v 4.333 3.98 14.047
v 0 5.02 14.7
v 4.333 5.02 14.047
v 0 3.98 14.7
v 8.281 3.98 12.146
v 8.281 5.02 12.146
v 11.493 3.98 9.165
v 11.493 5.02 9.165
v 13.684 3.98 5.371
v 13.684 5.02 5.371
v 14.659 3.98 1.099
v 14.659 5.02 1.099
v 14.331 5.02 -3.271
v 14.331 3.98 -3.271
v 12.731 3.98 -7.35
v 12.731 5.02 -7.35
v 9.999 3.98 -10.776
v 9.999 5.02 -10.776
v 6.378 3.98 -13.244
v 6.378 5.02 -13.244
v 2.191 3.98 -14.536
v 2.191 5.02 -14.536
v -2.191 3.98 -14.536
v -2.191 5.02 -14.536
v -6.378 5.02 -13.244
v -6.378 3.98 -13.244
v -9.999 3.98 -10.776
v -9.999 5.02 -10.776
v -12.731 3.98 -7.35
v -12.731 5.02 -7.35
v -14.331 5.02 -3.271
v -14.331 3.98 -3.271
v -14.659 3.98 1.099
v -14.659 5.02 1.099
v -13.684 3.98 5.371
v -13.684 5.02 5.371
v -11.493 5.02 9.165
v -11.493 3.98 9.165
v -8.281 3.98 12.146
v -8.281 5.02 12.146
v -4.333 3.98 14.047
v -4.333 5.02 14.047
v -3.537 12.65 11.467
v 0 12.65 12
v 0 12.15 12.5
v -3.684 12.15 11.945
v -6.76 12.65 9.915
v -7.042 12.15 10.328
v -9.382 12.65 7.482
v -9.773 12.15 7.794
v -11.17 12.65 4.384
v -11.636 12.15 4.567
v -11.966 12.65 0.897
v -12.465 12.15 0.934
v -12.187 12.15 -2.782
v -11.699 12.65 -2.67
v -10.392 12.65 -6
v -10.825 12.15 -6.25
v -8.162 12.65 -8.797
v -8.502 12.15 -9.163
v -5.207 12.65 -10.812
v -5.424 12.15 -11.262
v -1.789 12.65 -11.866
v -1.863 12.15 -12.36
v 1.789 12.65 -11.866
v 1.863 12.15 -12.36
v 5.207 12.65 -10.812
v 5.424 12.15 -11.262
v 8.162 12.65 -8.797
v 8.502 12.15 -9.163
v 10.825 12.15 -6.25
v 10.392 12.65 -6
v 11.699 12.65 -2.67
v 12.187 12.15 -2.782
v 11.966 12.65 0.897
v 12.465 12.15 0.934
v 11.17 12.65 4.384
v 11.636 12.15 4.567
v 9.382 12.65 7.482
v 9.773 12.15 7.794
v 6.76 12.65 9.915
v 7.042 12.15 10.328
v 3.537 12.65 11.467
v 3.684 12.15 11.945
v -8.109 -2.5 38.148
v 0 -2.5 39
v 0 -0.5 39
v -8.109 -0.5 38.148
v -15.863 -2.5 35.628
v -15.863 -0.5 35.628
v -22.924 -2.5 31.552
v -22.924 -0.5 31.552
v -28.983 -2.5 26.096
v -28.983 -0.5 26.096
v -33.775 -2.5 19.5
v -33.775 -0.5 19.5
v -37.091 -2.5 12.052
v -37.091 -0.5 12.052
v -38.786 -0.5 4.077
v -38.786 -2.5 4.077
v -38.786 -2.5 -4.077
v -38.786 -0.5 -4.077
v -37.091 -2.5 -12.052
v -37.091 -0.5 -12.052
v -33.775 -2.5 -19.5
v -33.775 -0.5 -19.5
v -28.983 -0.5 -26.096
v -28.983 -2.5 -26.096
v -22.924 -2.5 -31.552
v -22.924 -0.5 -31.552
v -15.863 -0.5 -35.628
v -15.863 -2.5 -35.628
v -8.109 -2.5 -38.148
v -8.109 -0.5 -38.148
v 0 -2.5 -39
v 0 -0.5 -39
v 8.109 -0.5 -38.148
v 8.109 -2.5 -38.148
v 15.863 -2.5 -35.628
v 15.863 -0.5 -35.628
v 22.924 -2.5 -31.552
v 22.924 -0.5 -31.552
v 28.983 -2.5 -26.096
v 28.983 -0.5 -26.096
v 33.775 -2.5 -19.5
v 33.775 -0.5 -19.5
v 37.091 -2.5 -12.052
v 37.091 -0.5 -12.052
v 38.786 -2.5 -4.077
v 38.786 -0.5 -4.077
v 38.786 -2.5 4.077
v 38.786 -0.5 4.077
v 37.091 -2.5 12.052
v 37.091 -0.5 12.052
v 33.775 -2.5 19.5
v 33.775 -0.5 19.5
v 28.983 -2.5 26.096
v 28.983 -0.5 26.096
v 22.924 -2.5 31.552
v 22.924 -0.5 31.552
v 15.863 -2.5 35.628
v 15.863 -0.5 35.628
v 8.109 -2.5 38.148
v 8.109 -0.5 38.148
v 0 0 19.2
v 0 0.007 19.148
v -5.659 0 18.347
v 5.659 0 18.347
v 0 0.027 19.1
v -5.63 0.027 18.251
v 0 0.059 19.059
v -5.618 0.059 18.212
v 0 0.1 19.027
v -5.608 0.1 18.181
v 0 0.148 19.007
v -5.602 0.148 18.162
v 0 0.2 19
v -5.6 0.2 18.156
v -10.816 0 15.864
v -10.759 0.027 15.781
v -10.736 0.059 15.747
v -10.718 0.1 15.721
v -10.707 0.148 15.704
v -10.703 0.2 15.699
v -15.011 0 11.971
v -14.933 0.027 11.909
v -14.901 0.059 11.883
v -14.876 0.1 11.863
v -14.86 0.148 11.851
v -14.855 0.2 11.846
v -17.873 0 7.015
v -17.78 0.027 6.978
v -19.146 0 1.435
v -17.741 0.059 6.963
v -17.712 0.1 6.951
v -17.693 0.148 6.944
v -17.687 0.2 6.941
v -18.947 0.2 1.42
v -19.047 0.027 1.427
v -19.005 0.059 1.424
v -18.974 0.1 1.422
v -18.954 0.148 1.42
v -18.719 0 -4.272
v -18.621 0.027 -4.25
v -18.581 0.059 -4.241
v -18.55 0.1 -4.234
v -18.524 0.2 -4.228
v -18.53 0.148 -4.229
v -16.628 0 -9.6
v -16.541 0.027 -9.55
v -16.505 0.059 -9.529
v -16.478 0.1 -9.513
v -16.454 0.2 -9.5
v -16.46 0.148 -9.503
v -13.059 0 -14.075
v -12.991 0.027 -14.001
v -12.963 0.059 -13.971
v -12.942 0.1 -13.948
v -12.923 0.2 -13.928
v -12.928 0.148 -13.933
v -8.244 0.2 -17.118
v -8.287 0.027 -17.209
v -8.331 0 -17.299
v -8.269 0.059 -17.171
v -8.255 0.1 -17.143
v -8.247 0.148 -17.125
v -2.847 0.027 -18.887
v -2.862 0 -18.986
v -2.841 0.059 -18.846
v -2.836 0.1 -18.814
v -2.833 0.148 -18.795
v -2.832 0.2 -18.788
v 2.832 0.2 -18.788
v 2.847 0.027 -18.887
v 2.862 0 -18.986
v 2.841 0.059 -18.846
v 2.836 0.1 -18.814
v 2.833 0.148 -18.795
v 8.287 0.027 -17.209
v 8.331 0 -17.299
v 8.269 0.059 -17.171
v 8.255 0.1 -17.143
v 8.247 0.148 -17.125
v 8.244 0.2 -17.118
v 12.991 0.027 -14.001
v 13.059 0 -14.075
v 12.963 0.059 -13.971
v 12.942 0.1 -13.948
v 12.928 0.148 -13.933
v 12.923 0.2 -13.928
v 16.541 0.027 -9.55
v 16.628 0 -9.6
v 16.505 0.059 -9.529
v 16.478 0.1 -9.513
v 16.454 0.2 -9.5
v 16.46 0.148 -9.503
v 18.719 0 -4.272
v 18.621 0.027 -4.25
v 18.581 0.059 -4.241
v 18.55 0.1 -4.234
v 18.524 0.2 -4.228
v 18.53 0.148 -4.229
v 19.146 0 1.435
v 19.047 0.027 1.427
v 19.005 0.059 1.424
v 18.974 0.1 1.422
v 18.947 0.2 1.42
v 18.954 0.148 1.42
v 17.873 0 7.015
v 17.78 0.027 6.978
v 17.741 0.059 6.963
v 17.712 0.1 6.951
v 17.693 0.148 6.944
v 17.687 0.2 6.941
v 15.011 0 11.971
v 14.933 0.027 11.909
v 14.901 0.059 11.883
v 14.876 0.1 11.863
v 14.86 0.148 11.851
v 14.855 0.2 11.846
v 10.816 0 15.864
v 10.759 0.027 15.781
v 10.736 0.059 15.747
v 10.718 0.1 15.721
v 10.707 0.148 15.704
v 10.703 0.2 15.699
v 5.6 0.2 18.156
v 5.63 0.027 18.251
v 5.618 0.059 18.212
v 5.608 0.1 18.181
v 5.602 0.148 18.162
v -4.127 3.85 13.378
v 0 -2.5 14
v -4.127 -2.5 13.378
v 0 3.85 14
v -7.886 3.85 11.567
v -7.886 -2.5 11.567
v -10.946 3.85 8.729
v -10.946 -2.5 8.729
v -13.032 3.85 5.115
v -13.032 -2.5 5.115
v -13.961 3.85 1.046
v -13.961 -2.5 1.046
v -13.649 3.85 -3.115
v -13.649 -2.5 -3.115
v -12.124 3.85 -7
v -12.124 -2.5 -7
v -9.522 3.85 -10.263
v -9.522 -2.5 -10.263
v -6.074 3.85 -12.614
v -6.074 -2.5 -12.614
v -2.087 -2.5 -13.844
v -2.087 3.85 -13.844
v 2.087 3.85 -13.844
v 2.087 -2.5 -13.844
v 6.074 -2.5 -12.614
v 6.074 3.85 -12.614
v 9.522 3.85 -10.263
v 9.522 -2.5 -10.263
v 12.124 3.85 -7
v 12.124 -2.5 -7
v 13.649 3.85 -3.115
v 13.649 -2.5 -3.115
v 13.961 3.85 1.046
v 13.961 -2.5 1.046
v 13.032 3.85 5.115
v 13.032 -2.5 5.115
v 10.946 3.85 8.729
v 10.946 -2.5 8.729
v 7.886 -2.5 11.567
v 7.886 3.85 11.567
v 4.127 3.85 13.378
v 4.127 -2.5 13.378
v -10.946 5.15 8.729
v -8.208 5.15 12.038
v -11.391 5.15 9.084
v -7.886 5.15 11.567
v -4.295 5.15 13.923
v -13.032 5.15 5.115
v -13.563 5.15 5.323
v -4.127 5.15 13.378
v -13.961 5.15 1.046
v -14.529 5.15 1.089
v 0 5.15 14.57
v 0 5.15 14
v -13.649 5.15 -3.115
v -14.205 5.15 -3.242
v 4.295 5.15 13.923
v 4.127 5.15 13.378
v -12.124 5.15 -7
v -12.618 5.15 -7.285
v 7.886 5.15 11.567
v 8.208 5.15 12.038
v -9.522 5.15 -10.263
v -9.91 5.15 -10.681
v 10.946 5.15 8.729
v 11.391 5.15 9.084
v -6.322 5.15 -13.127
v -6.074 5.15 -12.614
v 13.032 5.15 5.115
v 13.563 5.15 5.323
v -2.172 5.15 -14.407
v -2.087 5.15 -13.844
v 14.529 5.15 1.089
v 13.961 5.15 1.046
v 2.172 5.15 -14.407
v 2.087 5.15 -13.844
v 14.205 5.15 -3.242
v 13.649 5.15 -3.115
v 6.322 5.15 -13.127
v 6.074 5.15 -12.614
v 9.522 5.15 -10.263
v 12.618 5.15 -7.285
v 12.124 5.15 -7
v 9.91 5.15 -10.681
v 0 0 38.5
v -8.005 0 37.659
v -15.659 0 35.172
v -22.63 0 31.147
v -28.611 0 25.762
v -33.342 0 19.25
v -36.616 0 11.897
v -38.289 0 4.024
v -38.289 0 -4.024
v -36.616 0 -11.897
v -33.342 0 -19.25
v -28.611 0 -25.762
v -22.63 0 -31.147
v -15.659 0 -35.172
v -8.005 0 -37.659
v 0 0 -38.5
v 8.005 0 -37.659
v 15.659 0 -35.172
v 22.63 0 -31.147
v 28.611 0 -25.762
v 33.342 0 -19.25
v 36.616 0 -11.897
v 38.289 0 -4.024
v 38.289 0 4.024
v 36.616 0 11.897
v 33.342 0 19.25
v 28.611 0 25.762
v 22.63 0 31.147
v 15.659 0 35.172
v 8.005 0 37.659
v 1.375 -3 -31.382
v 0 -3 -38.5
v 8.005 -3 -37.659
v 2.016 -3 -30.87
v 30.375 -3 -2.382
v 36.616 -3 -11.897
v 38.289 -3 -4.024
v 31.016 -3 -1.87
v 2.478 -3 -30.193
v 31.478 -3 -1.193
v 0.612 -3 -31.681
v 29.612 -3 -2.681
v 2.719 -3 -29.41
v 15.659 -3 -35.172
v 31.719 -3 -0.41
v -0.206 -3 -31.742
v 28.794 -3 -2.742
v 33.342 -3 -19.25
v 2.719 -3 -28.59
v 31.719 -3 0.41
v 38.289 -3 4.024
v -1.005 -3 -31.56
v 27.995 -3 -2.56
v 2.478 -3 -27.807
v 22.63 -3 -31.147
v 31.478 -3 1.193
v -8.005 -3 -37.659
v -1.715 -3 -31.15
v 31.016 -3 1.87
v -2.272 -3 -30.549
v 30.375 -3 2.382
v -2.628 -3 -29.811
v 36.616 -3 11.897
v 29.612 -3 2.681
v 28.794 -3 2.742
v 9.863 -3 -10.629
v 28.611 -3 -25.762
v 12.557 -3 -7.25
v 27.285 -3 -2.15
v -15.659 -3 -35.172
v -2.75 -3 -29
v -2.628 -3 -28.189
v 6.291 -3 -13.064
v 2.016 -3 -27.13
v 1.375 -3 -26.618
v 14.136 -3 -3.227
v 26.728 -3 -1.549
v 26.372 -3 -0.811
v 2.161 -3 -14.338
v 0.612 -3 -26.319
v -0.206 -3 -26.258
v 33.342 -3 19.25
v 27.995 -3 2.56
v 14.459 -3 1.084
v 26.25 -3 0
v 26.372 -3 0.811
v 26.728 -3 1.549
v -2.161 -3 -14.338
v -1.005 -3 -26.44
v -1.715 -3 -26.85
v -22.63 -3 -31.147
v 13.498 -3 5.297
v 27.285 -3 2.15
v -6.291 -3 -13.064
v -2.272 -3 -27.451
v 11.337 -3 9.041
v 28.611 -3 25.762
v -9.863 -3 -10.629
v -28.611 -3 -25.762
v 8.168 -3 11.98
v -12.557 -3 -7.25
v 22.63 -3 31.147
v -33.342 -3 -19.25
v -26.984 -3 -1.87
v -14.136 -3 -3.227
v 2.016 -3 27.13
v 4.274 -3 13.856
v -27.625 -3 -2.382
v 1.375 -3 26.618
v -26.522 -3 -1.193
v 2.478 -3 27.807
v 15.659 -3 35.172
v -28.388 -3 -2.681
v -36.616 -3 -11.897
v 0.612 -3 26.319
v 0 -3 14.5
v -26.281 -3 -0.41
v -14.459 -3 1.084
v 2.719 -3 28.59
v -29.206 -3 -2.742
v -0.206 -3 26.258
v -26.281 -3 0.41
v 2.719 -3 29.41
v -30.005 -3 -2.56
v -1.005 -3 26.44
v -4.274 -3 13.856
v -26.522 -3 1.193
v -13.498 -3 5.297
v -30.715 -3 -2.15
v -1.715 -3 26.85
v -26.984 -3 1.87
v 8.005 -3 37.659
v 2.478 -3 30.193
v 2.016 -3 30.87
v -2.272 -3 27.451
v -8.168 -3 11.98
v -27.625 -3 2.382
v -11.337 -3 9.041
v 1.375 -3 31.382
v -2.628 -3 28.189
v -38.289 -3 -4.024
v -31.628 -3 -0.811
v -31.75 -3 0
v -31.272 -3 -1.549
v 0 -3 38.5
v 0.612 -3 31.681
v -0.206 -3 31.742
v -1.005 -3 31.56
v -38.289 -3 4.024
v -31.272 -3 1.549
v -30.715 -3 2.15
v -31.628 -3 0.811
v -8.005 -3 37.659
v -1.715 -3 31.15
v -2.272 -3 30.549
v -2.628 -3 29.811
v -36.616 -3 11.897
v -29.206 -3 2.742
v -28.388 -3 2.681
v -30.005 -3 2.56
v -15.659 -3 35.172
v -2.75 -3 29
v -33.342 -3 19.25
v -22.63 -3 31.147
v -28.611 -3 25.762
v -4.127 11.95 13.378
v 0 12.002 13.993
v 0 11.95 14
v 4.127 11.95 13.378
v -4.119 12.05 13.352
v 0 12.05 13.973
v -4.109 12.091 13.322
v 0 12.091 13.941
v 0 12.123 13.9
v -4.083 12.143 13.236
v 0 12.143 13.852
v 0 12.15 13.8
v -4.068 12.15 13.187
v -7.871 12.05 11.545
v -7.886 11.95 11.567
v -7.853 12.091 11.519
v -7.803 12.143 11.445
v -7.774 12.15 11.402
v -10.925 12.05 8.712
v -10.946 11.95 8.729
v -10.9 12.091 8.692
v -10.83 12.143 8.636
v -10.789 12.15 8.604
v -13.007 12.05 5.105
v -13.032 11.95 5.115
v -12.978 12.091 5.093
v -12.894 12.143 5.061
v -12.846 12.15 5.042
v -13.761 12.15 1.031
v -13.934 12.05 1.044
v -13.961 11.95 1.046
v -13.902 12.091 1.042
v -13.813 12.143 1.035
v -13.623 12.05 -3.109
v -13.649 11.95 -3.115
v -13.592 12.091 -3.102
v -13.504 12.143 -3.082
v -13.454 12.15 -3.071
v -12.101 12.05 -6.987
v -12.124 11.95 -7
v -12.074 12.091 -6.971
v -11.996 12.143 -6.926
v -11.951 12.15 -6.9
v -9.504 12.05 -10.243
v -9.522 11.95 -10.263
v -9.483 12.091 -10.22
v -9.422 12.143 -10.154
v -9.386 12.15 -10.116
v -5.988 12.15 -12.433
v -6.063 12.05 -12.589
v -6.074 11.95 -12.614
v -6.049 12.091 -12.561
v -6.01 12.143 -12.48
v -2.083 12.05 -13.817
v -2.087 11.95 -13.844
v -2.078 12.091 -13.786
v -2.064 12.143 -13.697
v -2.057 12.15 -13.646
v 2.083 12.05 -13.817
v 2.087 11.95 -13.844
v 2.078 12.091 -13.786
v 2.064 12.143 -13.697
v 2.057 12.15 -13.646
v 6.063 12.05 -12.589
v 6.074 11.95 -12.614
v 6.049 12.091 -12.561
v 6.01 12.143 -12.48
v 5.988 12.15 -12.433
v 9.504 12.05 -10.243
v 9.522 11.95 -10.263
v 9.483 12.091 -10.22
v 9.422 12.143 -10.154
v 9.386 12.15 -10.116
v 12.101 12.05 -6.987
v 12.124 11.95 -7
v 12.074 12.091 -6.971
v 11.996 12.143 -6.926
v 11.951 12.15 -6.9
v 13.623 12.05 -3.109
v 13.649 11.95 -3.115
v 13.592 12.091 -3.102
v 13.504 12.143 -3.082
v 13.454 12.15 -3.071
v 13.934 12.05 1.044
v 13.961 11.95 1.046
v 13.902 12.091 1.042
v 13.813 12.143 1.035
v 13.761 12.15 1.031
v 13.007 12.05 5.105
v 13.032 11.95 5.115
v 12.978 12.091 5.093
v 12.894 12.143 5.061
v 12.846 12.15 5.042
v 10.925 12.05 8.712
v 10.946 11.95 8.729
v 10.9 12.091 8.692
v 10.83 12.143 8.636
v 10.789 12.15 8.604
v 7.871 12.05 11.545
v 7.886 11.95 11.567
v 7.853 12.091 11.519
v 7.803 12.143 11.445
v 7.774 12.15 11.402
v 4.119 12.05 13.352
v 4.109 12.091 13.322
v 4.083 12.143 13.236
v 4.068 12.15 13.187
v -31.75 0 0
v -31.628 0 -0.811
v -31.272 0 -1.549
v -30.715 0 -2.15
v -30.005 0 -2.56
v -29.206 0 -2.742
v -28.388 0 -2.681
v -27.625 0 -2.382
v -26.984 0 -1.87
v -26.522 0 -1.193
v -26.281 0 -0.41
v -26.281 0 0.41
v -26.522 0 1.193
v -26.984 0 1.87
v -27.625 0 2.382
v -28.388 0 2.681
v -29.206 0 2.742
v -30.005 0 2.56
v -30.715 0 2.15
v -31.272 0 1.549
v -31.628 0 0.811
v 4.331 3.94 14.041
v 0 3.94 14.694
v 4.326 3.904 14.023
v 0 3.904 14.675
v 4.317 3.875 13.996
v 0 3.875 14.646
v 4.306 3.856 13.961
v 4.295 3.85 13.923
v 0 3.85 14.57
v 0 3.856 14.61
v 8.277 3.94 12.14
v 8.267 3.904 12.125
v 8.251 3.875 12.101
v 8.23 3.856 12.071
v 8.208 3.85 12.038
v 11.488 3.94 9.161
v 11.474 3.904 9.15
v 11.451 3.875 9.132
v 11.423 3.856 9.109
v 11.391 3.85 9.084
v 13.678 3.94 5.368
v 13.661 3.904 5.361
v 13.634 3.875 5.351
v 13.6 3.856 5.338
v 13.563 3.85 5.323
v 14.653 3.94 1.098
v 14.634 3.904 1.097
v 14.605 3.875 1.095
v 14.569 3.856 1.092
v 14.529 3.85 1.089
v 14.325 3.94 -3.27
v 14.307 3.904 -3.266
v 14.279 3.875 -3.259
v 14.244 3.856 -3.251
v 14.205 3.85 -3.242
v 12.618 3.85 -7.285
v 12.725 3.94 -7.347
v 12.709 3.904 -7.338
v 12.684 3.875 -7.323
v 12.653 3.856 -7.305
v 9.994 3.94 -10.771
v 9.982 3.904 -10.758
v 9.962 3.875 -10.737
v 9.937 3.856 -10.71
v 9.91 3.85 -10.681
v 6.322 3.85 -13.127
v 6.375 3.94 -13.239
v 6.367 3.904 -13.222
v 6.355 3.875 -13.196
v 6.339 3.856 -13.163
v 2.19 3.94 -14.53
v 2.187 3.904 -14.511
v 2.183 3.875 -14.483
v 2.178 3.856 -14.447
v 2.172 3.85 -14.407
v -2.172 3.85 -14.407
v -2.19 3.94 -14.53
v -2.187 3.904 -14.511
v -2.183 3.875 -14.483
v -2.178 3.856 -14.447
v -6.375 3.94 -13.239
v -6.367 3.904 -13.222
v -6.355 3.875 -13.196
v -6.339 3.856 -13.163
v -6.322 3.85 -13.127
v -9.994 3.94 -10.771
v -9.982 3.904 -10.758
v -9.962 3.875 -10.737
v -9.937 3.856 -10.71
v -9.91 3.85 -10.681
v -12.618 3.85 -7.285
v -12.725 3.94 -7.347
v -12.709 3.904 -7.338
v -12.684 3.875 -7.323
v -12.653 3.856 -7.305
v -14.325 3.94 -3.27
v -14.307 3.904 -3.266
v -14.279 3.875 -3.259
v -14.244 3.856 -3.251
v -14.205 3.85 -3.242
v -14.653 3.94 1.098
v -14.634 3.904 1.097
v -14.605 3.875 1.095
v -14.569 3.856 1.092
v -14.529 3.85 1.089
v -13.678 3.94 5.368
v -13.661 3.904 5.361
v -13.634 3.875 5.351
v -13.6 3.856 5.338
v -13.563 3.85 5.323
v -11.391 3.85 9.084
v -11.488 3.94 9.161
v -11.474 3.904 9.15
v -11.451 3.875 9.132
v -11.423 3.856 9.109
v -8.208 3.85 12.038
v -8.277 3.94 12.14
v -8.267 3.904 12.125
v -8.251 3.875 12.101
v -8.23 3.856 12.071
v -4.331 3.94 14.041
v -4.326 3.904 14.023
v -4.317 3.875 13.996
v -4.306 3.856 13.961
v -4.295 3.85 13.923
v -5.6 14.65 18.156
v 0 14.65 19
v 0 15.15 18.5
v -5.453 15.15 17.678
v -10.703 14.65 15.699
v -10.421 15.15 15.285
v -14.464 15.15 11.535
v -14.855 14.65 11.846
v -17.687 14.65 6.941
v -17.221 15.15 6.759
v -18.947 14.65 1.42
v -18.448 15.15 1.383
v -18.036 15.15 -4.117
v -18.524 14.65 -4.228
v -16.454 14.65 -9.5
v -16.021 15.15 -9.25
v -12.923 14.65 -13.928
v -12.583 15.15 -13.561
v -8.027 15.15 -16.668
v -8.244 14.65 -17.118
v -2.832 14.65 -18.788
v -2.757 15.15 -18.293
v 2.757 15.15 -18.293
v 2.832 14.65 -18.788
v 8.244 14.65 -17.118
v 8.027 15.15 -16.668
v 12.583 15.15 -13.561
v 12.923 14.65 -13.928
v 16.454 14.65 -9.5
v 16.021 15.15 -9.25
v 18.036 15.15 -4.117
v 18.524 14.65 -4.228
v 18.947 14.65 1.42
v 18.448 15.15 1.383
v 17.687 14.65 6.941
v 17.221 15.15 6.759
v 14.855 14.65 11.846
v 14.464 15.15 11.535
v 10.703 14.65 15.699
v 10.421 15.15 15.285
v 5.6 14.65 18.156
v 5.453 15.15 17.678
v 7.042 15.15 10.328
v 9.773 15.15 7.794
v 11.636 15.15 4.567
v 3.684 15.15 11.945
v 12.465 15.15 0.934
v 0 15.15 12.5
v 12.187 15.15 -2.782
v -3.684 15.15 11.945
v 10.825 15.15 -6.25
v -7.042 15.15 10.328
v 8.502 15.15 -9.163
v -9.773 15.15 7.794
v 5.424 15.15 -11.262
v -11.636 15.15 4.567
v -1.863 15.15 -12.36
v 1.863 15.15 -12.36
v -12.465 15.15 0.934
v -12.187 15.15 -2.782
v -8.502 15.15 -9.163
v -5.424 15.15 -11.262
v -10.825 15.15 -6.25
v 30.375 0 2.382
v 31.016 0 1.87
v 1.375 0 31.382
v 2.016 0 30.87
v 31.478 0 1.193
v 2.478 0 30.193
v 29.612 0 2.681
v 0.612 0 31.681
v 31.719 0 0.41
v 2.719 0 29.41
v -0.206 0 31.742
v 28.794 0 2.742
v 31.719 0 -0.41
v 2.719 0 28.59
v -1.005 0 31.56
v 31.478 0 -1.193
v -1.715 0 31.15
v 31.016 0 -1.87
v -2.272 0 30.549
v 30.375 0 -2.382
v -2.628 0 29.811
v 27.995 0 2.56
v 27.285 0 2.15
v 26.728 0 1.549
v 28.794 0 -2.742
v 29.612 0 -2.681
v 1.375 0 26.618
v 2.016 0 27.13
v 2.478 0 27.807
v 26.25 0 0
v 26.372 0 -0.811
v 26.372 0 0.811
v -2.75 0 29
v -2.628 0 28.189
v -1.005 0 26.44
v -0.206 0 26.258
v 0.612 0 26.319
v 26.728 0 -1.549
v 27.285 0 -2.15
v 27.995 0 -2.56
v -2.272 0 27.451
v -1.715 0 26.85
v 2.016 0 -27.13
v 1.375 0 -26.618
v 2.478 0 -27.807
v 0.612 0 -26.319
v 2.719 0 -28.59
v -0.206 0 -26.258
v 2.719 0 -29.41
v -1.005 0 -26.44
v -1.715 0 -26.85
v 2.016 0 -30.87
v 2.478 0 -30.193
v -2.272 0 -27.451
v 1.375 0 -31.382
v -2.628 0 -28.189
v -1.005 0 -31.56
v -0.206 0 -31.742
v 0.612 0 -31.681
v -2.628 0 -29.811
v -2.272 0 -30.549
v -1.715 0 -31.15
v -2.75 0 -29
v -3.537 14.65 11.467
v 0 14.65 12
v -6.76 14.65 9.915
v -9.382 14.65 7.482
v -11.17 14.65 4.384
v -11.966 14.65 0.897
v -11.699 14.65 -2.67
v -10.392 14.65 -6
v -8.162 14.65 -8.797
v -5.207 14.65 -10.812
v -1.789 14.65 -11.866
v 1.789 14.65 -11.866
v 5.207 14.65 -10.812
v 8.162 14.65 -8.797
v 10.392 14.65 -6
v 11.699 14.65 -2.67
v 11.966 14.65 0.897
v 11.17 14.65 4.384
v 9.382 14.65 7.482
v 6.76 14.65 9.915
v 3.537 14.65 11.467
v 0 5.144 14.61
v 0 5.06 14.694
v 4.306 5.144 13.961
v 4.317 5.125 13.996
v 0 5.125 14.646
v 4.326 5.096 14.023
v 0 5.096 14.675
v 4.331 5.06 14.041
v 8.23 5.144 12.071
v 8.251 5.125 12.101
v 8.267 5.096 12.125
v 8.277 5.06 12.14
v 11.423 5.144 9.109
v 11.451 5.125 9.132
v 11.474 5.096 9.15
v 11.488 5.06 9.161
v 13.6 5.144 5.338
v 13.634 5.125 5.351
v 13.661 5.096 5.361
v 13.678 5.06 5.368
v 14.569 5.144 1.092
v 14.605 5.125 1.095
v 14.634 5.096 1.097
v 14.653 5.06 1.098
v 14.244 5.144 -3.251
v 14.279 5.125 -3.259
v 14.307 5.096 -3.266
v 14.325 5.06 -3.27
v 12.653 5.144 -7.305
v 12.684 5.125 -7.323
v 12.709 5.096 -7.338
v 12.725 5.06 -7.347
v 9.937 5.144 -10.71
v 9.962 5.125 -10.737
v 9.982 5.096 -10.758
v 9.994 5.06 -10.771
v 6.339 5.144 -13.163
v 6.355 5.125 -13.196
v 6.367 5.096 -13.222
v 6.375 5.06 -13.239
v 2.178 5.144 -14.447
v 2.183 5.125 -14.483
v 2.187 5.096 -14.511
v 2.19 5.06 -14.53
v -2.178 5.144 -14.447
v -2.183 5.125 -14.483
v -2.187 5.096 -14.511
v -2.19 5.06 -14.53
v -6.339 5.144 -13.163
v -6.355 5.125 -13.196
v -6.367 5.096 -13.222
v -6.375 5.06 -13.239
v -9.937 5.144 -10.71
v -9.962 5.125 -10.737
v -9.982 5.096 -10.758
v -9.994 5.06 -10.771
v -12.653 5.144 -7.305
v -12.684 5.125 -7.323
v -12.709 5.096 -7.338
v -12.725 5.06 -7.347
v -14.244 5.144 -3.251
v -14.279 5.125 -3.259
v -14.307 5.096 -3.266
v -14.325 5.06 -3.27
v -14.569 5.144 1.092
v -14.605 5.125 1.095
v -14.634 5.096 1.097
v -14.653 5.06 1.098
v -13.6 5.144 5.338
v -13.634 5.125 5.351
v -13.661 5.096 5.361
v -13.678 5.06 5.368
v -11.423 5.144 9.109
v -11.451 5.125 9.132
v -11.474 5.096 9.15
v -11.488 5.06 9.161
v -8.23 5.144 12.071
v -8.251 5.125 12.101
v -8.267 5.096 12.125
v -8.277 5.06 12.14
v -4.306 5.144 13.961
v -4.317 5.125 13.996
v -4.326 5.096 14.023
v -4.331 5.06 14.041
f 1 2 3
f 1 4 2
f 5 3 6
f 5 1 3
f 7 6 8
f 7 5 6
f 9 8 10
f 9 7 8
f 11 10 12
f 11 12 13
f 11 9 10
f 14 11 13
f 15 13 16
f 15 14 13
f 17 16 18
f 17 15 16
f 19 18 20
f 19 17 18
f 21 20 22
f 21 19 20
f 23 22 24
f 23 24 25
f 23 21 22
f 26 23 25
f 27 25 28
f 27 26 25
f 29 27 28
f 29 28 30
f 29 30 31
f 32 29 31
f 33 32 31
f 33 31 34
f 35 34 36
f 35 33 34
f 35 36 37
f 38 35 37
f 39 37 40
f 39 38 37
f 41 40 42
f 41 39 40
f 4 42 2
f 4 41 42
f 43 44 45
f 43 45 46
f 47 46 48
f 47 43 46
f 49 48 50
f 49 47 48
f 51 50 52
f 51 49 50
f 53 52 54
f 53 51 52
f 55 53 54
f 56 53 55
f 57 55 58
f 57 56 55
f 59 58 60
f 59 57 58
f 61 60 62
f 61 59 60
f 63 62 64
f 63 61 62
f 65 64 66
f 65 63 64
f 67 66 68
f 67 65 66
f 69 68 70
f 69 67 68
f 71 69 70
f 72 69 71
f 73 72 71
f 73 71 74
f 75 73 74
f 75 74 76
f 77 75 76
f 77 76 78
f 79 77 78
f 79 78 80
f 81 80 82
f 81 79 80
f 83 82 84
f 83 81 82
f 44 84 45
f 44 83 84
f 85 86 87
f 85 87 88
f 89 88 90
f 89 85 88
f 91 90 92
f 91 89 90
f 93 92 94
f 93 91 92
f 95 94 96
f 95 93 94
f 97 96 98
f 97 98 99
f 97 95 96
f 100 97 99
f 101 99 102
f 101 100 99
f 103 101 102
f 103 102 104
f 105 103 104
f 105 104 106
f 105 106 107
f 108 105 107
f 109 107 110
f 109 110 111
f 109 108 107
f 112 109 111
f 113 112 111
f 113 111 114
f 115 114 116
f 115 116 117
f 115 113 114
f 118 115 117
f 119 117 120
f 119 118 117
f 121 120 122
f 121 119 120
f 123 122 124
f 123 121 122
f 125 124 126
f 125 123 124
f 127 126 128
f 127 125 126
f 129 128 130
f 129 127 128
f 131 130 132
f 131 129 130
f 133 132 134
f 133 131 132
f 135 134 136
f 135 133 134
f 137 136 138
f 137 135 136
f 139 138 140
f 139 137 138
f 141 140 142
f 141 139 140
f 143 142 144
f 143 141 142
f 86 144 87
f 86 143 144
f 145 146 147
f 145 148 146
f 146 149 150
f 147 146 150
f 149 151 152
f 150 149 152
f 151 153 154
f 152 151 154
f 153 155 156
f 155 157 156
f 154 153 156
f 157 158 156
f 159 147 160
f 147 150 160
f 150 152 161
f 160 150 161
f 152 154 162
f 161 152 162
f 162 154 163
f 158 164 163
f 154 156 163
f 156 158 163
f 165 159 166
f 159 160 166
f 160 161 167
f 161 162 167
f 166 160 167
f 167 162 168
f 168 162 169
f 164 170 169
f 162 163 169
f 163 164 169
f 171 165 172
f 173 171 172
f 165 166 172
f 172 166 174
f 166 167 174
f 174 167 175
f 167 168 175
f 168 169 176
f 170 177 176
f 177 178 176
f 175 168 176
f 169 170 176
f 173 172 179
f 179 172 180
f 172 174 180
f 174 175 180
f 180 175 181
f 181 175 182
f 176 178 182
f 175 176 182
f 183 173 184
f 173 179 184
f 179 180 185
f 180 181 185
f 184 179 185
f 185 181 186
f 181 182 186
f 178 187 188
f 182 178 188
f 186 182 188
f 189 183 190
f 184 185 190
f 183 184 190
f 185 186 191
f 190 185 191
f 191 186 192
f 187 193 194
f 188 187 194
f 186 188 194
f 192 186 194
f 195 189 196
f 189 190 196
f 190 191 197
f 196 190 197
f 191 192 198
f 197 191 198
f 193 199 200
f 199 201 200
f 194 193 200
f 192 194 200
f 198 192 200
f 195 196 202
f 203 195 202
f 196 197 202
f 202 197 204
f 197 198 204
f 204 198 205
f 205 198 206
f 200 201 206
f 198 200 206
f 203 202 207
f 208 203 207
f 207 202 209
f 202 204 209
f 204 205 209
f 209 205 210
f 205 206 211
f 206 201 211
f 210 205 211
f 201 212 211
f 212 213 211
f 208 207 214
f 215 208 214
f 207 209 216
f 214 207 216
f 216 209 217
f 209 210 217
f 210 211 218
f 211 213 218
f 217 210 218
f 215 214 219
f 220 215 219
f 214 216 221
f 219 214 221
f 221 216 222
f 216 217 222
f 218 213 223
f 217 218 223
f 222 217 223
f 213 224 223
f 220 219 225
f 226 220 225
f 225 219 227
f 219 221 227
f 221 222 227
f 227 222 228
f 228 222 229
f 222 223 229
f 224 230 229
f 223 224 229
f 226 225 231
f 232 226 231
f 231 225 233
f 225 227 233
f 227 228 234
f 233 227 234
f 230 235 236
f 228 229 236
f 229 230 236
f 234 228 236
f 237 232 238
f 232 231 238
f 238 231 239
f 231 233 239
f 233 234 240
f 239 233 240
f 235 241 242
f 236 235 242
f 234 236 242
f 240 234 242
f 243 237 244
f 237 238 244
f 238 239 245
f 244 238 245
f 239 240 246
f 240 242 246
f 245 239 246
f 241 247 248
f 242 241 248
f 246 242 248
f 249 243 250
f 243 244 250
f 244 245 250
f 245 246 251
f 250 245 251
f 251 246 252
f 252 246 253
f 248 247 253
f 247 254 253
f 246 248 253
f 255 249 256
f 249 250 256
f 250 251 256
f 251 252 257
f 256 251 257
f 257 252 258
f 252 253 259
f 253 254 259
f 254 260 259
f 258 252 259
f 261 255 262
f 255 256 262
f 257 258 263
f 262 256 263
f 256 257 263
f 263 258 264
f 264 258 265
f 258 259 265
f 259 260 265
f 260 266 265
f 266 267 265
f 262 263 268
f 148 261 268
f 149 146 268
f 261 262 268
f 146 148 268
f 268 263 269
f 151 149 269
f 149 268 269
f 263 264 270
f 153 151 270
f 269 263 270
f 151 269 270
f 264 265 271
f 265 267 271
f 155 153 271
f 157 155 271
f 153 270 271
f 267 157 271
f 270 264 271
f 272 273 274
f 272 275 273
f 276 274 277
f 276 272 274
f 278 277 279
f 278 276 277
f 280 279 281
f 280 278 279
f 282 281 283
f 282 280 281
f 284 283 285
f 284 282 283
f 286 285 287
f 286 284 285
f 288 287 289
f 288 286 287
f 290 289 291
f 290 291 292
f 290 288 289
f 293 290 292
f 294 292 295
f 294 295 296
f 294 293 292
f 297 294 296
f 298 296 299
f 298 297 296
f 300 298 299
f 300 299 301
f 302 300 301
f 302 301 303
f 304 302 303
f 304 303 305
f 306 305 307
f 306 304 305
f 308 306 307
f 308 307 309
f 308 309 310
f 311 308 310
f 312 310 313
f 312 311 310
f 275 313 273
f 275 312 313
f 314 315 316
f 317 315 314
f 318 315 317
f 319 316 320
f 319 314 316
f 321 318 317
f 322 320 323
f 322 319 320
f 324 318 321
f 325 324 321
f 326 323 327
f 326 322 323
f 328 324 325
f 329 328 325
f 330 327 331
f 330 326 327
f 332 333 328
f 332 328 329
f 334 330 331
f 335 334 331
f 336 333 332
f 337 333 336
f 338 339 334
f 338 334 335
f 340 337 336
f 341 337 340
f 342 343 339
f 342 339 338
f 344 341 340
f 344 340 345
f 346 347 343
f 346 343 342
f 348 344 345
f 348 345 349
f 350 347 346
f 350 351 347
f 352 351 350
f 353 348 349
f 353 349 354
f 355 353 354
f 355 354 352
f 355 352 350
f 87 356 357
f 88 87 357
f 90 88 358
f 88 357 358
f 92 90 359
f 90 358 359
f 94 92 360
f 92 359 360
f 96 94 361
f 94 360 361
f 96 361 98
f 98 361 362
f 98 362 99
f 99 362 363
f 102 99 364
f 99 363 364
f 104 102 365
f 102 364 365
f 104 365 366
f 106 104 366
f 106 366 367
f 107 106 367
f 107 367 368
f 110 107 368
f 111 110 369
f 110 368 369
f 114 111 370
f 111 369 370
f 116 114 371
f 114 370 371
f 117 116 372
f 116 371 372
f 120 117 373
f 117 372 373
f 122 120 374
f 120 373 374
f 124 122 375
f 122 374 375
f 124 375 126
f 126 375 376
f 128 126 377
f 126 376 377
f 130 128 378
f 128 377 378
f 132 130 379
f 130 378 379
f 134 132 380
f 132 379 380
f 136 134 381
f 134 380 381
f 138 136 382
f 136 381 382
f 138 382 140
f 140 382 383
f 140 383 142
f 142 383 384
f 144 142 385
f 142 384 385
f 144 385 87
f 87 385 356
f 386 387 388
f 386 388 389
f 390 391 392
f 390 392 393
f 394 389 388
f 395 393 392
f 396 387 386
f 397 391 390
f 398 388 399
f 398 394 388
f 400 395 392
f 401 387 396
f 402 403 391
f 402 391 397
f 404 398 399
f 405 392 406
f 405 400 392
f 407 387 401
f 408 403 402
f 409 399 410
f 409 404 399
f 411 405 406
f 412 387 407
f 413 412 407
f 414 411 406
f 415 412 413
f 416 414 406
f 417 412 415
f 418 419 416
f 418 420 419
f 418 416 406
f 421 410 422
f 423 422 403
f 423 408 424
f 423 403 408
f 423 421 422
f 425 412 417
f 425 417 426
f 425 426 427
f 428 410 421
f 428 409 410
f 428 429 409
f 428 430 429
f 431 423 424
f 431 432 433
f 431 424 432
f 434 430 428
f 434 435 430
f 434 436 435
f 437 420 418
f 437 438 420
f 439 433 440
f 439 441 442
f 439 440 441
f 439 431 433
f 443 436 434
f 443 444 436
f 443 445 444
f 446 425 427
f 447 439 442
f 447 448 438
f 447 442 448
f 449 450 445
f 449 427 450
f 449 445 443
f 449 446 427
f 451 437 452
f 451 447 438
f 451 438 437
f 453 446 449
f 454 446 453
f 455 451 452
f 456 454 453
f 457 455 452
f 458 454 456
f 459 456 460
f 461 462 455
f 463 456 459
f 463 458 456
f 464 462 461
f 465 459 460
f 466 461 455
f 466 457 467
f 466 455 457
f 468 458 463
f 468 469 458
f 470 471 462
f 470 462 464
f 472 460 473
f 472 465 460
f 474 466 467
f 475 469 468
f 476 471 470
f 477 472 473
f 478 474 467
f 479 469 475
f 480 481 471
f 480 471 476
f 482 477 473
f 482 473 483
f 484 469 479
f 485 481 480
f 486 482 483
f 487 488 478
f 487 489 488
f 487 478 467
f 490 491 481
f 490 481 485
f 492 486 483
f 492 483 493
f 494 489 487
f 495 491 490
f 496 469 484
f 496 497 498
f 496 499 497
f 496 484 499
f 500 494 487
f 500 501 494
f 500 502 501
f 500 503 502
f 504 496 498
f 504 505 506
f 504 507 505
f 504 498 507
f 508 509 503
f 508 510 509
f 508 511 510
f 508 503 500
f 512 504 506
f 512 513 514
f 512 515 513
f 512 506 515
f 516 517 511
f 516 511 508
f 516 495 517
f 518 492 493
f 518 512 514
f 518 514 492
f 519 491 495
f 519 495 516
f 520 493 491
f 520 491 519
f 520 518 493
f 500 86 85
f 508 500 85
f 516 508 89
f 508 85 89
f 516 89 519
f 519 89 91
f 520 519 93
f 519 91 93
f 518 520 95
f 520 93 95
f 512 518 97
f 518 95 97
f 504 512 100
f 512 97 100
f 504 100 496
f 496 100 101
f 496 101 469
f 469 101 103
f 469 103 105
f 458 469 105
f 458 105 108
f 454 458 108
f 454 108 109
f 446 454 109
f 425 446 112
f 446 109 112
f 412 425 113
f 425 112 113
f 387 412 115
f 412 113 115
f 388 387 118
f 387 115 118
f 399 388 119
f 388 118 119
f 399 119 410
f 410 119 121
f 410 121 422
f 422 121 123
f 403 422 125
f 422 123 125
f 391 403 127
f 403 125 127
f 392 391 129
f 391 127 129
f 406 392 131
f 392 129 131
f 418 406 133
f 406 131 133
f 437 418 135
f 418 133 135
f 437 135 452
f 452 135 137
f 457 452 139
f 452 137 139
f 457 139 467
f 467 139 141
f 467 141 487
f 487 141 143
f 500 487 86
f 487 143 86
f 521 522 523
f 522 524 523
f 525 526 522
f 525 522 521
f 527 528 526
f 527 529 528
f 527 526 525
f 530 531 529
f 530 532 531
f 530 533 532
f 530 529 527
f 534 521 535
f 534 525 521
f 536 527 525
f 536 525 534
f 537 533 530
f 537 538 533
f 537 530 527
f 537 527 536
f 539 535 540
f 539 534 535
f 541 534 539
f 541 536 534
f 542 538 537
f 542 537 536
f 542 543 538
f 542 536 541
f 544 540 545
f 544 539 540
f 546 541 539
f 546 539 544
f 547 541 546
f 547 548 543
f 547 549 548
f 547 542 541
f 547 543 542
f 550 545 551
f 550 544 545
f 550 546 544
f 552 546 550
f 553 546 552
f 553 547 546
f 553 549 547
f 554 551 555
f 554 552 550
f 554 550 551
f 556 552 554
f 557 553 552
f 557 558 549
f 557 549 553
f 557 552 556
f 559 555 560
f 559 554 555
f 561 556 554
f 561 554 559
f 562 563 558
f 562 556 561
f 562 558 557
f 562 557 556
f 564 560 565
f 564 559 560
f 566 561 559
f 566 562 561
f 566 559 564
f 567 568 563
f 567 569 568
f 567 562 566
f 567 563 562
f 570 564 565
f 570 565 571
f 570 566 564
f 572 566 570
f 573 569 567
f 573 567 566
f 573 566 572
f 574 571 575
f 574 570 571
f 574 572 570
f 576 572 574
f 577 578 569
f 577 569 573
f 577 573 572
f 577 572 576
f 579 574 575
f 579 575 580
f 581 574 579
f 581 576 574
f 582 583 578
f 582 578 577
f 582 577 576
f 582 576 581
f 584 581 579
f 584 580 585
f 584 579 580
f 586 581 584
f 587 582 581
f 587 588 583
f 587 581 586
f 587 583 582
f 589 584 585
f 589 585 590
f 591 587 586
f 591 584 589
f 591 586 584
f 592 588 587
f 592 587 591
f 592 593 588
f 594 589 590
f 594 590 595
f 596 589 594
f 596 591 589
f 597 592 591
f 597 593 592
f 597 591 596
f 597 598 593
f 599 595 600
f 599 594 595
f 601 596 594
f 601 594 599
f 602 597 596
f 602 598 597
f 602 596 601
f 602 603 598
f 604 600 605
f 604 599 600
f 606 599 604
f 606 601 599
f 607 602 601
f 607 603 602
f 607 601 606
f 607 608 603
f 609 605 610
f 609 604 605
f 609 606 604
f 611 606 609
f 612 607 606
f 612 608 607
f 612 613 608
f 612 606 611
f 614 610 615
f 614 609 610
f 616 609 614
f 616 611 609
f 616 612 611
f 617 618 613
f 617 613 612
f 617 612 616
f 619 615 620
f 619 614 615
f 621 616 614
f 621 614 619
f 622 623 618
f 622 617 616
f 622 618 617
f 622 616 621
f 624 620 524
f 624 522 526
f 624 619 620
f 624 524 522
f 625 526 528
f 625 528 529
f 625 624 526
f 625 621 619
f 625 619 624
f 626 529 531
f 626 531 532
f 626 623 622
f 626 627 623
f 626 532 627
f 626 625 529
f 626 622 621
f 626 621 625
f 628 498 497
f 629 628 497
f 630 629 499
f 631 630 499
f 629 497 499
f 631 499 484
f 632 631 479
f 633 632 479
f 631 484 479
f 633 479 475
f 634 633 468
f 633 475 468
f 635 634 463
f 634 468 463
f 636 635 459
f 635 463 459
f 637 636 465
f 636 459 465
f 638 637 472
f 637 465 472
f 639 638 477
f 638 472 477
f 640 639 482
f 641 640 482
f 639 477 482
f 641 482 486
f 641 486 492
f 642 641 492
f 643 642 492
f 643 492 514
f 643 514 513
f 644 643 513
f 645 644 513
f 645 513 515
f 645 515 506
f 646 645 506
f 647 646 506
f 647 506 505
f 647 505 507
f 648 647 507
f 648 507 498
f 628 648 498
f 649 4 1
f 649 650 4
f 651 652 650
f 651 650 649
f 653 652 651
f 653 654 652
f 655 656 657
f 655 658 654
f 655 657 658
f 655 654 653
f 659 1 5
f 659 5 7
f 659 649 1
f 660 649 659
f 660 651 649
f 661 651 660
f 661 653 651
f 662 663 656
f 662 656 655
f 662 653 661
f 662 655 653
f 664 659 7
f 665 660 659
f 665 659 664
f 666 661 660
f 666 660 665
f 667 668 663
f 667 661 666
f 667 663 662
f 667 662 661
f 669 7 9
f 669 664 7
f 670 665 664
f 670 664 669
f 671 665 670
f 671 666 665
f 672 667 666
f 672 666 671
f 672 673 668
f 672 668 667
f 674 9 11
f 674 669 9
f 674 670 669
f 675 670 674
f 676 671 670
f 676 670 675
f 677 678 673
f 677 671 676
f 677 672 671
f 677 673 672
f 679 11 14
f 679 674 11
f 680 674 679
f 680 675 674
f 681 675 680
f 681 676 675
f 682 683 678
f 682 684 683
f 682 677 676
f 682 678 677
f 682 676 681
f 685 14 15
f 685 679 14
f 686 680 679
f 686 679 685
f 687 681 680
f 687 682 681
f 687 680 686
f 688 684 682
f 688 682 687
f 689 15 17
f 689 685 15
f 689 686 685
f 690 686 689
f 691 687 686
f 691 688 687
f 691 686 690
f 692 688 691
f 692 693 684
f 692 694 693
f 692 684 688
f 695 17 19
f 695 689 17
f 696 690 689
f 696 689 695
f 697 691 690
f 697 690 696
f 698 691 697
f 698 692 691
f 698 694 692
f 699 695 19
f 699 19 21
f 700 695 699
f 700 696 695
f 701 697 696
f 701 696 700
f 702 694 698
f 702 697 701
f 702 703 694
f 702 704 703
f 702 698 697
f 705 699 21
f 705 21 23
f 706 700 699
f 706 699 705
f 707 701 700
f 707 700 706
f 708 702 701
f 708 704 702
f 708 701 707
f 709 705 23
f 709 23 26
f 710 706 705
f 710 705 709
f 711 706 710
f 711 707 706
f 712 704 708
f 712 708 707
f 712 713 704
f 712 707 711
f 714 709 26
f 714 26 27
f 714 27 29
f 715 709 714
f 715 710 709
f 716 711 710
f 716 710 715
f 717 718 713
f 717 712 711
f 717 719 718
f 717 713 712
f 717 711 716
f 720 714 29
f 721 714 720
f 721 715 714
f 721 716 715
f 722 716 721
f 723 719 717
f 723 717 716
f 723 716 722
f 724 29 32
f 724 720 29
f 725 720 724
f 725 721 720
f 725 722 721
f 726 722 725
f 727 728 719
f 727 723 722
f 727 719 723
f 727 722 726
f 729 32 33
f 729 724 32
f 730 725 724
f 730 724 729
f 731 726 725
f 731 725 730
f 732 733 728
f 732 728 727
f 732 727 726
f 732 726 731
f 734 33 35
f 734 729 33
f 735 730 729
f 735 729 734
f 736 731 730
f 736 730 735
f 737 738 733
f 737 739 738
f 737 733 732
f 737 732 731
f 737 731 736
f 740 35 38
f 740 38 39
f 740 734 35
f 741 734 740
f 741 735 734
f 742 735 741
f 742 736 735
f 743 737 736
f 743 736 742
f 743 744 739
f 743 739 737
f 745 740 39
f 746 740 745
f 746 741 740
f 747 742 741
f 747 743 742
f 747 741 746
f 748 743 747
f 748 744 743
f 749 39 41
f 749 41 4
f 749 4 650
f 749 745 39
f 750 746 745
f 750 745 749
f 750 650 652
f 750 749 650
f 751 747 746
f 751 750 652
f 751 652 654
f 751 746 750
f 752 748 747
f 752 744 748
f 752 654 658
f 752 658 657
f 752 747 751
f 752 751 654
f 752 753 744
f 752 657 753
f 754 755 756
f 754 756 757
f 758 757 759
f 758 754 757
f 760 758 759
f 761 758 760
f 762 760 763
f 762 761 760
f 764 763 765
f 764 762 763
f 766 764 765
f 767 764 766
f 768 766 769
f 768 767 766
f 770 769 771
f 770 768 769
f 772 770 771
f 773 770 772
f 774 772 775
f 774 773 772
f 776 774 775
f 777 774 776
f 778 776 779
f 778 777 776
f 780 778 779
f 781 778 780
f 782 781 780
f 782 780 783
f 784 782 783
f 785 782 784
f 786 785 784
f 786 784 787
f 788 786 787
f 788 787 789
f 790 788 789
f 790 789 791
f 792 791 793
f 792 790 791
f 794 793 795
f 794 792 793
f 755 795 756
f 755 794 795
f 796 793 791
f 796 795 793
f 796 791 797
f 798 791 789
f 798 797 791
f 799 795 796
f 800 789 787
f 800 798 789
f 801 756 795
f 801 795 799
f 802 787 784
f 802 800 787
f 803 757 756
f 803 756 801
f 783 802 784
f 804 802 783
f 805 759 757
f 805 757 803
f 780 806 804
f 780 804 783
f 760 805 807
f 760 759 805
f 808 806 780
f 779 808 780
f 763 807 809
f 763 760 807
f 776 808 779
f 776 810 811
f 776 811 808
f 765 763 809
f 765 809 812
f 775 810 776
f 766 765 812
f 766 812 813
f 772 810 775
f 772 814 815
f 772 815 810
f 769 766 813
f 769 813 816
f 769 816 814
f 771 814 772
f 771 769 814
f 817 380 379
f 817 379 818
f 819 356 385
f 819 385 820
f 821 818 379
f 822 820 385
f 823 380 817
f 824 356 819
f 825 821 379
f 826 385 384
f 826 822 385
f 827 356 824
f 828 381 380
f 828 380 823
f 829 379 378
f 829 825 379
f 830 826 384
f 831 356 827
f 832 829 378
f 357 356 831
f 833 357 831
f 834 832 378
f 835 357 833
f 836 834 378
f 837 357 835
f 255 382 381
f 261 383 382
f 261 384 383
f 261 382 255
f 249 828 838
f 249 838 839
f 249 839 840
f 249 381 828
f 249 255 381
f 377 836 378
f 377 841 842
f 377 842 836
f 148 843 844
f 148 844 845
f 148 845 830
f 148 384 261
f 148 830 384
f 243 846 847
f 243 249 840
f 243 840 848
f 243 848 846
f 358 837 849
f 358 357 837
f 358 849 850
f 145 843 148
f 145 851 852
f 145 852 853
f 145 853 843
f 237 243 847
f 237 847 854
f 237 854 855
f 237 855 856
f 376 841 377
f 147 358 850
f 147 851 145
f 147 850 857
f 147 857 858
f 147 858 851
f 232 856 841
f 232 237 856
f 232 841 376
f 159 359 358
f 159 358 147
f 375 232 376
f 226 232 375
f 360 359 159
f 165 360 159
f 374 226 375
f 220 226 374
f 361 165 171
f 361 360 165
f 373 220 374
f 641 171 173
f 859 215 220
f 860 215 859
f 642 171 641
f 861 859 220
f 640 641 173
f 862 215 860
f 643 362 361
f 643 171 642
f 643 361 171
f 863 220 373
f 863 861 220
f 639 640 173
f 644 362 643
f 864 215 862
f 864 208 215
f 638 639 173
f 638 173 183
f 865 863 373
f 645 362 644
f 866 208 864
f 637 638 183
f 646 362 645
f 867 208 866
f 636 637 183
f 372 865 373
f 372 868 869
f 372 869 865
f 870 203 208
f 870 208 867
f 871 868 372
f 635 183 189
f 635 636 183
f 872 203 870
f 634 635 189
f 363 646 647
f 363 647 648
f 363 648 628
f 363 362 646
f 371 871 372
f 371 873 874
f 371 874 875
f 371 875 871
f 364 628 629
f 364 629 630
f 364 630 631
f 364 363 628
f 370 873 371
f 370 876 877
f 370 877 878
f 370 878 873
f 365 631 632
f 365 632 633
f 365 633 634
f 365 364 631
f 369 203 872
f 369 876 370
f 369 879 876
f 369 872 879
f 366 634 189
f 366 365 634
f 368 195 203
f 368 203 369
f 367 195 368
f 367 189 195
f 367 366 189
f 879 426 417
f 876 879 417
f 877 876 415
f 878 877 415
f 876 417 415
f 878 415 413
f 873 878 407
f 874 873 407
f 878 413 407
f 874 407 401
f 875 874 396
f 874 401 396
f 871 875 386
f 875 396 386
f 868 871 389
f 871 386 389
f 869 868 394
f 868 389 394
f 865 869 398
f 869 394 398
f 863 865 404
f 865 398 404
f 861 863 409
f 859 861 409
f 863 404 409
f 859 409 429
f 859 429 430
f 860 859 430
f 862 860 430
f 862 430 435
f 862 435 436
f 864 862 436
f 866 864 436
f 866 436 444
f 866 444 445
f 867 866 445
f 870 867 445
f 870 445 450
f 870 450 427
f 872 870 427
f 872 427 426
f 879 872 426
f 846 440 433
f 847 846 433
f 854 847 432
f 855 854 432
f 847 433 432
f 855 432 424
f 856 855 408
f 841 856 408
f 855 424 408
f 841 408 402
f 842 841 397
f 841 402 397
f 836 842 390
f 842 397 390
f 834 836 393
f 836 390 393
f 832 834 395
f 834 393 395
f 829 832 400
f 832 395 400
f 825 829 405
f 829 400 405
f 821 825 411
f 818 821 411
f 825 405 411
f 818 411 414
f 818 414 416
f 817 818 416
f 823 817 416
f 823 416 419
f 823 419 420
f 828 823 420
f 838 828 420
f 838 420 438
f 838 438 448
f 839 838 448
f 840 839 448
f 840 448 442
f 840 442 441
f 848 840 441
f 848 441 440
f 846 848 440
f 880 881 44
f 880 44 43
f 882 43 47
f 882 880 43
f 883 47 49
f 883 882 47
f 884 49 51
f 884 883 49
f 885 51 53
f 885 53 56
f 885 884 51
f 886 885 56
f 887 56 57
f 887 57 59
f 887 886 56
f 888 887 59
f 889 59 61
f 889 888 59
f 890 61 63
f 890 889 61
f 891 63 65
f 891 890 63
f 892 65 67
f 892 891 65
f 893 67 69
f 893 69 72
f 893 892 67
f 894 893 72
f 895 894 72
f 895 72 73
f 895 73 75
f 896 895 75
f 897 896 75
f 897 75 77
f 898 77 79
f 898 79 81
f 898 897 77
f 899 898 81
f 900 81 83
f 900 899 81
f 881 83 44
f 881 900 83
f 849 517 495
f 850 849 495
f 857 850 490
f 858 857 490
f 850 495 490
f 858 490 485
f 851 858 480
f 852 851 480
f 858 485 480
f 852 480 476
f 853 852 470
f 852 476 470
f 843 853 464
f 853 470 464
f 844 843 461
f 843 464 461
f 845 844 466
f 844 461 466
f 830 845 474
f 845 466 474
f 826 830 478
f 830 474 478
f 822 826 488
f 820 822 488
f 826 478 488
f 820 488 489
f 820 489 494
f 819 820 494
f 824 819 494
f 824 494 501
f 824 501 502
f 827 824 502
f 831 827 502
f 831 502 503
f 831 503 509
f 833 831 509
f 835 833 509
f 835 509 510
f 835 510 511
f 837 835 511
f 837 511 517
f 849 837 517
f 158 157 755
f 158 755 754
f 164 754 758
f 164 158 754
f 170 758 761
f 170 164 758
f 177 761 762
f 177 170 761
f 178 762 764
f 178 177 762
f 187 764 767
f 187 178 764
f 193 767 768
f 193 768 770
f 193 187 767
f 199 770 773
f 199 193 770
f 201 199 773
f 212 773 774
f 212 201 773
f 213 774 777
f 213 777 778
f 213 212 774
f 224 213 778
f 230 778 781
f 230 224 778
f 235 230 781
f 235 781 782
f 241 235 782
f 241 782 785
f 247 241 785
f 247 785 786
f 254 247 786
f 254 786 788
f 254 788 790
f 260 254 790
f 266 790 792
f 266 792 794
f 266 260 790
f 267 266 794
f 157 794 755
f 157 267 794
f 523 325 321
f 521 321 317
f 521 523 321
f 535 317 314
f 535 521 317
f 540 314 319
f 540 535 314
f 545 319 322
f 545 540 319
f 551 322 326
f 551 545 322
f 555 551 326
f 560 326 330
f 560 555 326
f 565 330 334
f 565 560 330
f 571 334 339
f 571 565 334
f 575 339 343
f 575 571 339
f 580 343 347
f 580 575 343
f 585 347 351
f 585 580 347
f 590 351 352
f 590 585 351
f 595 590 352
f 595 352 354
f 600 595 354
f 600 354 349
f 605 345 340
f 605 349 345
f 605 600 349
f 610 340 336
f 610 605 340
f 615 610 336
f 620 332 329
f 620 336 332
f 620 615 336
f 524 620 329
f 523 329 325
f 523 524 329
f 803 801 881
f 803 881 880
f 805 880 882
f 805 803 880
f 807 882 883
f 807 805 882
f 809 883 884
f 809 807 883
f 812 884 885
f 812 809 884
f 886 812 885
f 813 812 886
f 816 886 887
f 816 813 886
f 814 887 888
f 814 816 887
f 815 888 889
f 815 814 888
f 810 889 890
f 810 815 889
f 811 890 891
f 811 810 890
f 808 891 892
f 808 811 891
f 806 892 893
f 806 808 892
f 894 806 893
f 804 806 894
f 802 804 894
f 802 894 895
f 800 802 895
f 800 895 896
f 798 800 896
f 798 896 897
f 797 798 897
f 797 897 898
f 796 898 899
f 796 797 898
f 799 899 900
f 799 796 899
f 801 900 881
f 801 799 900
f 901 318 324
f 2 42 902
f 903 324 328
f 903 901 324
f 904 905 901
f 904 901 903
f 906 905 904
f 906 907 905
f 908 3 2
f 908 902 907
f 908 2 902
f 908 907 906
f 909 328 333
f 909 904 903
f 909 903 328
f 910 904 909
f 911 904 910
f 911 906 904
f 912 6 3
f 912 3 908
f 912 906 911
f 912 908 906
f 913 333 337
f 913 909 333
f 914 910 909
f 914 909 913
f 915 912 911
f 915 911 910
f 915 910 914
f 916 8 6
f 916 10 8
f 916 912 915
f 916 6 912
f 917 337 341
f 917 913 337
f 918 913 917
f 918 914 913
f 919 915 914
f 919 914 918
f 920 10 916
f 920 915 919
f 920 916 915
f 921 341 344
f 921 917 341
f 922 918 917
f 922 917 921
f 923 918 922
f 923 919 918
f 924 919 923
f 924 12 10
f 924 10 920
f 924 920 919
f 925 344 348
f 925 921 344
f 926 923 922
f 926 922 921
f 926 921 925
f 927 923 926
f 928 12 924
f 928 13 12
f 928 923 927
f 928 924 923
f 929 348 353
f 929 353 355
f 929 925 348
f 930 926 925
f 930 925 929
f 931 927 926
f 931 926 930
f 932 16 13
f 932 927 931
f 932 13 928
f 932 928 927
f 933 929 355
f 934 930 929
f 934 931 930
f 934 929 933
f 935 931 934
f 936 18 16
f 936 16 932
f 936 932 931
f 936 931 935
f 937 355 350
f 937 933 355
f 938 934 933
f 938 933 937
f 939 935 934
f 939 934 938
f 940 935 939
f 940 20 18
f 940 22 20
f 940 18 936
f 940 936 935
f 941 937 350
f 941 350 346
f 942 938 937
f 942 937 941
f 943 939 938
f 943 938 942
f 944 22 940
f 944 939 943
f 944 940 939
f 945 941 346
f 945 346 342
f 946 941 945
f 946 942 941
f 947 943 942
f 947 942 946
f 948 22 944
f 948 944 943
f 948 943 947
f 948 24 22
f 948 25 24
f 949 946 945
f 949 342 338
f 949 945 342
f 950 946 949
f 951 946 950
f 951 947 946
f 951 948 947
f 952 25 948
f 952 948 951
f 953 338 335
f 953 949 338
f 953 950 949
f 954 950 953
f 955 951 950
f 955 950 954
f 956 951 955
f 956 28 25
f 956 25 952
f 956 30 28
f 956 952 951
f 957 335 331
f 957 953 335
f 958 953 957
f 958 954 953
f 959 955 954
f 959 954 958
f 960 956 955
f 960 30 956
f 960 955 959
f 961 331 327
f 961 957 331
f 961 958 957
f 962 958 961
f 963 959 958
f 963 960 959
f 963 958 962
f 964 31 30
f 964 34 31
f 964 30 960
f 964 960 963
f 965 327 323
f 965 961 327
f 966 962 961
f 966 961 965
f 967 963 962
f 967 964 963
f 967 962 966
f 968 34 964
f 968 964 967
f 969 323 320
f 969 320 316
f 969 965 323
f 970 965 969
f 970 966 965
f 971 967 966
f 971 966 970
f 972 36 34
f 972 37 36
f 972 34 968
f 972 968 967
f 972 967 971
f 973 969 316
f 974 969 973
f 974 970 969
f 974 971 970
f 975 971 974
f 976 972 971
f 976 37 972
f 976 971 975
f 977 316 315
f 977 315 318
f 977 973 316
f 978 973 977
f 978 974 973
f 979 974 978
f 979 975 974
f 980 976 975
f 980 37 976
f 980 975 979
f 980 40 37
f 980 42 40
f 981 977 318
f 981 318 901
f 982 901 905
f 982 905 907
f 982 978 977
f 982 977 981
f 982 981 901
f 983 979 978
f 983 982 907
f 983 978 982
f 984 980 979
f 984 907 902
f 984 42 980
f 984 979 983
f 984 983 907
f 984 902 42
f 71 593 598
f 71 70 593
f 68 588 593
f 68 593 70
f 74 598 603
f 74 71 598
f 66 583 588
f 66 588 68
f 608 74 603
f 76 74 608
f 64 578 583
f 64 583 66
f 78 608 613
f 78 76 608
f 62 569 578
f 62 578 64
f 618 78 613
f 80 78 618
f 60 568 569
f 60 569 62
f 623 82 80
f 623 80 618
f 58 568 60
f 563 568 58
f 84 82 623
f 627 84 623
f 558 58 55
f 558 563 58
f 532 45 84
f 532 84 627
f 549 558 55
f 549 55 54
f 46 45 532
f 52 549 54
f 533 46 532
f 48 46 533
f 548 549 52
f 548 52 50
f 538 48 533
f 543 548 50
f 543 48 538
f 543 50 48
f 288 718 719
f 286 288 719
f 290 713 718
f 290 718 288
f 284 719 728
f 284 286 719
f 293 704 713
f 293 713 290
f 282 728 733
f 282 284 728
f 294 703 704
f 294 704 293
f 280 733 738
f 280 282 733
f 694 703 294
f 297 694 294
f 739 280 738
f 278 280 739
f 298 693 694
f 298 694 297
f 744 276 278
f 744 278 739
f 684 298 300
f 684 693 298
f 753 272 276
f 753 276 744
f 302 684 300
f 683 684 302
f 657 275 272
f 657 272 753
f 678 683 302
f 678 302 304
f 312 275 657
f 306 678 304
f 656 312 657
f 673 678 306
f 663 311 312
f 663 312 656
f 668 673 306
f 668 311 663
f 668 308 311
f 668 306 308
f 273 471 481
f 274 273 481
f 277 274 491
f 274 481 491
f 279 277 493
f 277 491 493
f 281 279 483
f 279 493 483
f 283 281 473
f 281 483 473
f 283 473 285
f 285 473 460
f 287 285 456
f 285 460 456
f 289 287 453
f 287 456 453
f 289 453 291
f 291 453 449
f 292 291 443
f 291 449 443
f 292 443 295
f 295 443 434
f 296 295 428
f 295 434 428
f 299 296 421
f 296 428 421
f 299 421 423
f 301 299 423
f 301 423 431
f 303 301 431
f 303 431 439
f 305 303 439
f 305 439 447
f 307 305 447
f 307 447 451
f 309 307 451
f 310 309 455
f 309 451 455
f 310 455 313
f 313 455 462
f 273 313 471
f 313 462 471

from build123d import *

# Parameters (mm, degrees)
M5_CLEARANCE_HOLE1_D = 5.5
FILLET1_R            = 0.2
CHAMFER1_SIZE        = 0.5


with BuildPart() as part:
    # Sketch1 → Revolve1 (revolve)
    with BuildSketch(Plane.XY, mode=Mode.PRIVATE) as revolve1_sk:
        Polygon((14, -3), (14, 12.15), (12, 12.15), (12, 15.15), (19, 15.15), (19, 0), (39, 0), (39, -3), align=None)
    revolve(revolve1_sk.sketch.rotate(Axis((0, 17.954019247, 0), (0, -1, 0)), 90), axis=Axis((0, 17.954019247, 0), (0, -1, 0)))

    # M5 Clearance Hole1 (through all)
    with Locations(Plane(origin=(0, 0, 0), x_dir=(1, 0, 0), z_dir=(0, 1, 0))):
        with Locations((0, 29), (29, 0), (0, -29), (-29, 0)):
            Hole(M5_CLEARANCE_HOLE1_D / 2)

    # Fillet1
    fillet1_edges = [part.edges().sort_by_distance(p)[0] for p in [
        (0, 0, -19),
        (0, 12.15, -14),
    ]]
    fillet(fillet1_edges, radius=FILLET1_R)

    # Chamfer1
    chamfer1_edges = [part.edges().sort_by_distance(p)[0] for p in [
        (0, 12.15, -12),
        (0, 15.15, -12),
        (0, 15.15, -19),
        (0, 0, -39),
        (0, -3, -39),
        (0, -3, -14),
    ]]
    chamfer(chamfer1_edges, length=CHAMFER1_SIZE)

    # Sketch14 → Groove for BS 3673 P4 - B028M, Internal Circlip1 (revolve, cut)
    with BuildSketch(Plane(origin=(0, 17.954019247, 0), x_dir=(0, 0, 1), z_dir=(-1, 0, 0))):
        with BuildLine():
            Line((14.57, -14.104019247), (12.6, -14.104019247))
            Line((12.6, -14.104019247), (12.6, -12.804019247))
            Line((12.6, -12.804019247), (14.57, -12.804019247))
            ThreePointArc((14.57, -12.804019247), (14.661923882, -12.842095365), (14.7, -12.934019247))
            Line((14.7, -12.934019247), (14.7, -13.974019247))
            ThreePointArc((14.7, -13.974019247), (14.661923882, -14.065943128), (14.57, -14.104019247))
        make_face()
    revolve(axis=Axis((0, -32.045980753, 0), (0, 1, 0)), mode=Mode.SUBTRACT)


solid = part.part
